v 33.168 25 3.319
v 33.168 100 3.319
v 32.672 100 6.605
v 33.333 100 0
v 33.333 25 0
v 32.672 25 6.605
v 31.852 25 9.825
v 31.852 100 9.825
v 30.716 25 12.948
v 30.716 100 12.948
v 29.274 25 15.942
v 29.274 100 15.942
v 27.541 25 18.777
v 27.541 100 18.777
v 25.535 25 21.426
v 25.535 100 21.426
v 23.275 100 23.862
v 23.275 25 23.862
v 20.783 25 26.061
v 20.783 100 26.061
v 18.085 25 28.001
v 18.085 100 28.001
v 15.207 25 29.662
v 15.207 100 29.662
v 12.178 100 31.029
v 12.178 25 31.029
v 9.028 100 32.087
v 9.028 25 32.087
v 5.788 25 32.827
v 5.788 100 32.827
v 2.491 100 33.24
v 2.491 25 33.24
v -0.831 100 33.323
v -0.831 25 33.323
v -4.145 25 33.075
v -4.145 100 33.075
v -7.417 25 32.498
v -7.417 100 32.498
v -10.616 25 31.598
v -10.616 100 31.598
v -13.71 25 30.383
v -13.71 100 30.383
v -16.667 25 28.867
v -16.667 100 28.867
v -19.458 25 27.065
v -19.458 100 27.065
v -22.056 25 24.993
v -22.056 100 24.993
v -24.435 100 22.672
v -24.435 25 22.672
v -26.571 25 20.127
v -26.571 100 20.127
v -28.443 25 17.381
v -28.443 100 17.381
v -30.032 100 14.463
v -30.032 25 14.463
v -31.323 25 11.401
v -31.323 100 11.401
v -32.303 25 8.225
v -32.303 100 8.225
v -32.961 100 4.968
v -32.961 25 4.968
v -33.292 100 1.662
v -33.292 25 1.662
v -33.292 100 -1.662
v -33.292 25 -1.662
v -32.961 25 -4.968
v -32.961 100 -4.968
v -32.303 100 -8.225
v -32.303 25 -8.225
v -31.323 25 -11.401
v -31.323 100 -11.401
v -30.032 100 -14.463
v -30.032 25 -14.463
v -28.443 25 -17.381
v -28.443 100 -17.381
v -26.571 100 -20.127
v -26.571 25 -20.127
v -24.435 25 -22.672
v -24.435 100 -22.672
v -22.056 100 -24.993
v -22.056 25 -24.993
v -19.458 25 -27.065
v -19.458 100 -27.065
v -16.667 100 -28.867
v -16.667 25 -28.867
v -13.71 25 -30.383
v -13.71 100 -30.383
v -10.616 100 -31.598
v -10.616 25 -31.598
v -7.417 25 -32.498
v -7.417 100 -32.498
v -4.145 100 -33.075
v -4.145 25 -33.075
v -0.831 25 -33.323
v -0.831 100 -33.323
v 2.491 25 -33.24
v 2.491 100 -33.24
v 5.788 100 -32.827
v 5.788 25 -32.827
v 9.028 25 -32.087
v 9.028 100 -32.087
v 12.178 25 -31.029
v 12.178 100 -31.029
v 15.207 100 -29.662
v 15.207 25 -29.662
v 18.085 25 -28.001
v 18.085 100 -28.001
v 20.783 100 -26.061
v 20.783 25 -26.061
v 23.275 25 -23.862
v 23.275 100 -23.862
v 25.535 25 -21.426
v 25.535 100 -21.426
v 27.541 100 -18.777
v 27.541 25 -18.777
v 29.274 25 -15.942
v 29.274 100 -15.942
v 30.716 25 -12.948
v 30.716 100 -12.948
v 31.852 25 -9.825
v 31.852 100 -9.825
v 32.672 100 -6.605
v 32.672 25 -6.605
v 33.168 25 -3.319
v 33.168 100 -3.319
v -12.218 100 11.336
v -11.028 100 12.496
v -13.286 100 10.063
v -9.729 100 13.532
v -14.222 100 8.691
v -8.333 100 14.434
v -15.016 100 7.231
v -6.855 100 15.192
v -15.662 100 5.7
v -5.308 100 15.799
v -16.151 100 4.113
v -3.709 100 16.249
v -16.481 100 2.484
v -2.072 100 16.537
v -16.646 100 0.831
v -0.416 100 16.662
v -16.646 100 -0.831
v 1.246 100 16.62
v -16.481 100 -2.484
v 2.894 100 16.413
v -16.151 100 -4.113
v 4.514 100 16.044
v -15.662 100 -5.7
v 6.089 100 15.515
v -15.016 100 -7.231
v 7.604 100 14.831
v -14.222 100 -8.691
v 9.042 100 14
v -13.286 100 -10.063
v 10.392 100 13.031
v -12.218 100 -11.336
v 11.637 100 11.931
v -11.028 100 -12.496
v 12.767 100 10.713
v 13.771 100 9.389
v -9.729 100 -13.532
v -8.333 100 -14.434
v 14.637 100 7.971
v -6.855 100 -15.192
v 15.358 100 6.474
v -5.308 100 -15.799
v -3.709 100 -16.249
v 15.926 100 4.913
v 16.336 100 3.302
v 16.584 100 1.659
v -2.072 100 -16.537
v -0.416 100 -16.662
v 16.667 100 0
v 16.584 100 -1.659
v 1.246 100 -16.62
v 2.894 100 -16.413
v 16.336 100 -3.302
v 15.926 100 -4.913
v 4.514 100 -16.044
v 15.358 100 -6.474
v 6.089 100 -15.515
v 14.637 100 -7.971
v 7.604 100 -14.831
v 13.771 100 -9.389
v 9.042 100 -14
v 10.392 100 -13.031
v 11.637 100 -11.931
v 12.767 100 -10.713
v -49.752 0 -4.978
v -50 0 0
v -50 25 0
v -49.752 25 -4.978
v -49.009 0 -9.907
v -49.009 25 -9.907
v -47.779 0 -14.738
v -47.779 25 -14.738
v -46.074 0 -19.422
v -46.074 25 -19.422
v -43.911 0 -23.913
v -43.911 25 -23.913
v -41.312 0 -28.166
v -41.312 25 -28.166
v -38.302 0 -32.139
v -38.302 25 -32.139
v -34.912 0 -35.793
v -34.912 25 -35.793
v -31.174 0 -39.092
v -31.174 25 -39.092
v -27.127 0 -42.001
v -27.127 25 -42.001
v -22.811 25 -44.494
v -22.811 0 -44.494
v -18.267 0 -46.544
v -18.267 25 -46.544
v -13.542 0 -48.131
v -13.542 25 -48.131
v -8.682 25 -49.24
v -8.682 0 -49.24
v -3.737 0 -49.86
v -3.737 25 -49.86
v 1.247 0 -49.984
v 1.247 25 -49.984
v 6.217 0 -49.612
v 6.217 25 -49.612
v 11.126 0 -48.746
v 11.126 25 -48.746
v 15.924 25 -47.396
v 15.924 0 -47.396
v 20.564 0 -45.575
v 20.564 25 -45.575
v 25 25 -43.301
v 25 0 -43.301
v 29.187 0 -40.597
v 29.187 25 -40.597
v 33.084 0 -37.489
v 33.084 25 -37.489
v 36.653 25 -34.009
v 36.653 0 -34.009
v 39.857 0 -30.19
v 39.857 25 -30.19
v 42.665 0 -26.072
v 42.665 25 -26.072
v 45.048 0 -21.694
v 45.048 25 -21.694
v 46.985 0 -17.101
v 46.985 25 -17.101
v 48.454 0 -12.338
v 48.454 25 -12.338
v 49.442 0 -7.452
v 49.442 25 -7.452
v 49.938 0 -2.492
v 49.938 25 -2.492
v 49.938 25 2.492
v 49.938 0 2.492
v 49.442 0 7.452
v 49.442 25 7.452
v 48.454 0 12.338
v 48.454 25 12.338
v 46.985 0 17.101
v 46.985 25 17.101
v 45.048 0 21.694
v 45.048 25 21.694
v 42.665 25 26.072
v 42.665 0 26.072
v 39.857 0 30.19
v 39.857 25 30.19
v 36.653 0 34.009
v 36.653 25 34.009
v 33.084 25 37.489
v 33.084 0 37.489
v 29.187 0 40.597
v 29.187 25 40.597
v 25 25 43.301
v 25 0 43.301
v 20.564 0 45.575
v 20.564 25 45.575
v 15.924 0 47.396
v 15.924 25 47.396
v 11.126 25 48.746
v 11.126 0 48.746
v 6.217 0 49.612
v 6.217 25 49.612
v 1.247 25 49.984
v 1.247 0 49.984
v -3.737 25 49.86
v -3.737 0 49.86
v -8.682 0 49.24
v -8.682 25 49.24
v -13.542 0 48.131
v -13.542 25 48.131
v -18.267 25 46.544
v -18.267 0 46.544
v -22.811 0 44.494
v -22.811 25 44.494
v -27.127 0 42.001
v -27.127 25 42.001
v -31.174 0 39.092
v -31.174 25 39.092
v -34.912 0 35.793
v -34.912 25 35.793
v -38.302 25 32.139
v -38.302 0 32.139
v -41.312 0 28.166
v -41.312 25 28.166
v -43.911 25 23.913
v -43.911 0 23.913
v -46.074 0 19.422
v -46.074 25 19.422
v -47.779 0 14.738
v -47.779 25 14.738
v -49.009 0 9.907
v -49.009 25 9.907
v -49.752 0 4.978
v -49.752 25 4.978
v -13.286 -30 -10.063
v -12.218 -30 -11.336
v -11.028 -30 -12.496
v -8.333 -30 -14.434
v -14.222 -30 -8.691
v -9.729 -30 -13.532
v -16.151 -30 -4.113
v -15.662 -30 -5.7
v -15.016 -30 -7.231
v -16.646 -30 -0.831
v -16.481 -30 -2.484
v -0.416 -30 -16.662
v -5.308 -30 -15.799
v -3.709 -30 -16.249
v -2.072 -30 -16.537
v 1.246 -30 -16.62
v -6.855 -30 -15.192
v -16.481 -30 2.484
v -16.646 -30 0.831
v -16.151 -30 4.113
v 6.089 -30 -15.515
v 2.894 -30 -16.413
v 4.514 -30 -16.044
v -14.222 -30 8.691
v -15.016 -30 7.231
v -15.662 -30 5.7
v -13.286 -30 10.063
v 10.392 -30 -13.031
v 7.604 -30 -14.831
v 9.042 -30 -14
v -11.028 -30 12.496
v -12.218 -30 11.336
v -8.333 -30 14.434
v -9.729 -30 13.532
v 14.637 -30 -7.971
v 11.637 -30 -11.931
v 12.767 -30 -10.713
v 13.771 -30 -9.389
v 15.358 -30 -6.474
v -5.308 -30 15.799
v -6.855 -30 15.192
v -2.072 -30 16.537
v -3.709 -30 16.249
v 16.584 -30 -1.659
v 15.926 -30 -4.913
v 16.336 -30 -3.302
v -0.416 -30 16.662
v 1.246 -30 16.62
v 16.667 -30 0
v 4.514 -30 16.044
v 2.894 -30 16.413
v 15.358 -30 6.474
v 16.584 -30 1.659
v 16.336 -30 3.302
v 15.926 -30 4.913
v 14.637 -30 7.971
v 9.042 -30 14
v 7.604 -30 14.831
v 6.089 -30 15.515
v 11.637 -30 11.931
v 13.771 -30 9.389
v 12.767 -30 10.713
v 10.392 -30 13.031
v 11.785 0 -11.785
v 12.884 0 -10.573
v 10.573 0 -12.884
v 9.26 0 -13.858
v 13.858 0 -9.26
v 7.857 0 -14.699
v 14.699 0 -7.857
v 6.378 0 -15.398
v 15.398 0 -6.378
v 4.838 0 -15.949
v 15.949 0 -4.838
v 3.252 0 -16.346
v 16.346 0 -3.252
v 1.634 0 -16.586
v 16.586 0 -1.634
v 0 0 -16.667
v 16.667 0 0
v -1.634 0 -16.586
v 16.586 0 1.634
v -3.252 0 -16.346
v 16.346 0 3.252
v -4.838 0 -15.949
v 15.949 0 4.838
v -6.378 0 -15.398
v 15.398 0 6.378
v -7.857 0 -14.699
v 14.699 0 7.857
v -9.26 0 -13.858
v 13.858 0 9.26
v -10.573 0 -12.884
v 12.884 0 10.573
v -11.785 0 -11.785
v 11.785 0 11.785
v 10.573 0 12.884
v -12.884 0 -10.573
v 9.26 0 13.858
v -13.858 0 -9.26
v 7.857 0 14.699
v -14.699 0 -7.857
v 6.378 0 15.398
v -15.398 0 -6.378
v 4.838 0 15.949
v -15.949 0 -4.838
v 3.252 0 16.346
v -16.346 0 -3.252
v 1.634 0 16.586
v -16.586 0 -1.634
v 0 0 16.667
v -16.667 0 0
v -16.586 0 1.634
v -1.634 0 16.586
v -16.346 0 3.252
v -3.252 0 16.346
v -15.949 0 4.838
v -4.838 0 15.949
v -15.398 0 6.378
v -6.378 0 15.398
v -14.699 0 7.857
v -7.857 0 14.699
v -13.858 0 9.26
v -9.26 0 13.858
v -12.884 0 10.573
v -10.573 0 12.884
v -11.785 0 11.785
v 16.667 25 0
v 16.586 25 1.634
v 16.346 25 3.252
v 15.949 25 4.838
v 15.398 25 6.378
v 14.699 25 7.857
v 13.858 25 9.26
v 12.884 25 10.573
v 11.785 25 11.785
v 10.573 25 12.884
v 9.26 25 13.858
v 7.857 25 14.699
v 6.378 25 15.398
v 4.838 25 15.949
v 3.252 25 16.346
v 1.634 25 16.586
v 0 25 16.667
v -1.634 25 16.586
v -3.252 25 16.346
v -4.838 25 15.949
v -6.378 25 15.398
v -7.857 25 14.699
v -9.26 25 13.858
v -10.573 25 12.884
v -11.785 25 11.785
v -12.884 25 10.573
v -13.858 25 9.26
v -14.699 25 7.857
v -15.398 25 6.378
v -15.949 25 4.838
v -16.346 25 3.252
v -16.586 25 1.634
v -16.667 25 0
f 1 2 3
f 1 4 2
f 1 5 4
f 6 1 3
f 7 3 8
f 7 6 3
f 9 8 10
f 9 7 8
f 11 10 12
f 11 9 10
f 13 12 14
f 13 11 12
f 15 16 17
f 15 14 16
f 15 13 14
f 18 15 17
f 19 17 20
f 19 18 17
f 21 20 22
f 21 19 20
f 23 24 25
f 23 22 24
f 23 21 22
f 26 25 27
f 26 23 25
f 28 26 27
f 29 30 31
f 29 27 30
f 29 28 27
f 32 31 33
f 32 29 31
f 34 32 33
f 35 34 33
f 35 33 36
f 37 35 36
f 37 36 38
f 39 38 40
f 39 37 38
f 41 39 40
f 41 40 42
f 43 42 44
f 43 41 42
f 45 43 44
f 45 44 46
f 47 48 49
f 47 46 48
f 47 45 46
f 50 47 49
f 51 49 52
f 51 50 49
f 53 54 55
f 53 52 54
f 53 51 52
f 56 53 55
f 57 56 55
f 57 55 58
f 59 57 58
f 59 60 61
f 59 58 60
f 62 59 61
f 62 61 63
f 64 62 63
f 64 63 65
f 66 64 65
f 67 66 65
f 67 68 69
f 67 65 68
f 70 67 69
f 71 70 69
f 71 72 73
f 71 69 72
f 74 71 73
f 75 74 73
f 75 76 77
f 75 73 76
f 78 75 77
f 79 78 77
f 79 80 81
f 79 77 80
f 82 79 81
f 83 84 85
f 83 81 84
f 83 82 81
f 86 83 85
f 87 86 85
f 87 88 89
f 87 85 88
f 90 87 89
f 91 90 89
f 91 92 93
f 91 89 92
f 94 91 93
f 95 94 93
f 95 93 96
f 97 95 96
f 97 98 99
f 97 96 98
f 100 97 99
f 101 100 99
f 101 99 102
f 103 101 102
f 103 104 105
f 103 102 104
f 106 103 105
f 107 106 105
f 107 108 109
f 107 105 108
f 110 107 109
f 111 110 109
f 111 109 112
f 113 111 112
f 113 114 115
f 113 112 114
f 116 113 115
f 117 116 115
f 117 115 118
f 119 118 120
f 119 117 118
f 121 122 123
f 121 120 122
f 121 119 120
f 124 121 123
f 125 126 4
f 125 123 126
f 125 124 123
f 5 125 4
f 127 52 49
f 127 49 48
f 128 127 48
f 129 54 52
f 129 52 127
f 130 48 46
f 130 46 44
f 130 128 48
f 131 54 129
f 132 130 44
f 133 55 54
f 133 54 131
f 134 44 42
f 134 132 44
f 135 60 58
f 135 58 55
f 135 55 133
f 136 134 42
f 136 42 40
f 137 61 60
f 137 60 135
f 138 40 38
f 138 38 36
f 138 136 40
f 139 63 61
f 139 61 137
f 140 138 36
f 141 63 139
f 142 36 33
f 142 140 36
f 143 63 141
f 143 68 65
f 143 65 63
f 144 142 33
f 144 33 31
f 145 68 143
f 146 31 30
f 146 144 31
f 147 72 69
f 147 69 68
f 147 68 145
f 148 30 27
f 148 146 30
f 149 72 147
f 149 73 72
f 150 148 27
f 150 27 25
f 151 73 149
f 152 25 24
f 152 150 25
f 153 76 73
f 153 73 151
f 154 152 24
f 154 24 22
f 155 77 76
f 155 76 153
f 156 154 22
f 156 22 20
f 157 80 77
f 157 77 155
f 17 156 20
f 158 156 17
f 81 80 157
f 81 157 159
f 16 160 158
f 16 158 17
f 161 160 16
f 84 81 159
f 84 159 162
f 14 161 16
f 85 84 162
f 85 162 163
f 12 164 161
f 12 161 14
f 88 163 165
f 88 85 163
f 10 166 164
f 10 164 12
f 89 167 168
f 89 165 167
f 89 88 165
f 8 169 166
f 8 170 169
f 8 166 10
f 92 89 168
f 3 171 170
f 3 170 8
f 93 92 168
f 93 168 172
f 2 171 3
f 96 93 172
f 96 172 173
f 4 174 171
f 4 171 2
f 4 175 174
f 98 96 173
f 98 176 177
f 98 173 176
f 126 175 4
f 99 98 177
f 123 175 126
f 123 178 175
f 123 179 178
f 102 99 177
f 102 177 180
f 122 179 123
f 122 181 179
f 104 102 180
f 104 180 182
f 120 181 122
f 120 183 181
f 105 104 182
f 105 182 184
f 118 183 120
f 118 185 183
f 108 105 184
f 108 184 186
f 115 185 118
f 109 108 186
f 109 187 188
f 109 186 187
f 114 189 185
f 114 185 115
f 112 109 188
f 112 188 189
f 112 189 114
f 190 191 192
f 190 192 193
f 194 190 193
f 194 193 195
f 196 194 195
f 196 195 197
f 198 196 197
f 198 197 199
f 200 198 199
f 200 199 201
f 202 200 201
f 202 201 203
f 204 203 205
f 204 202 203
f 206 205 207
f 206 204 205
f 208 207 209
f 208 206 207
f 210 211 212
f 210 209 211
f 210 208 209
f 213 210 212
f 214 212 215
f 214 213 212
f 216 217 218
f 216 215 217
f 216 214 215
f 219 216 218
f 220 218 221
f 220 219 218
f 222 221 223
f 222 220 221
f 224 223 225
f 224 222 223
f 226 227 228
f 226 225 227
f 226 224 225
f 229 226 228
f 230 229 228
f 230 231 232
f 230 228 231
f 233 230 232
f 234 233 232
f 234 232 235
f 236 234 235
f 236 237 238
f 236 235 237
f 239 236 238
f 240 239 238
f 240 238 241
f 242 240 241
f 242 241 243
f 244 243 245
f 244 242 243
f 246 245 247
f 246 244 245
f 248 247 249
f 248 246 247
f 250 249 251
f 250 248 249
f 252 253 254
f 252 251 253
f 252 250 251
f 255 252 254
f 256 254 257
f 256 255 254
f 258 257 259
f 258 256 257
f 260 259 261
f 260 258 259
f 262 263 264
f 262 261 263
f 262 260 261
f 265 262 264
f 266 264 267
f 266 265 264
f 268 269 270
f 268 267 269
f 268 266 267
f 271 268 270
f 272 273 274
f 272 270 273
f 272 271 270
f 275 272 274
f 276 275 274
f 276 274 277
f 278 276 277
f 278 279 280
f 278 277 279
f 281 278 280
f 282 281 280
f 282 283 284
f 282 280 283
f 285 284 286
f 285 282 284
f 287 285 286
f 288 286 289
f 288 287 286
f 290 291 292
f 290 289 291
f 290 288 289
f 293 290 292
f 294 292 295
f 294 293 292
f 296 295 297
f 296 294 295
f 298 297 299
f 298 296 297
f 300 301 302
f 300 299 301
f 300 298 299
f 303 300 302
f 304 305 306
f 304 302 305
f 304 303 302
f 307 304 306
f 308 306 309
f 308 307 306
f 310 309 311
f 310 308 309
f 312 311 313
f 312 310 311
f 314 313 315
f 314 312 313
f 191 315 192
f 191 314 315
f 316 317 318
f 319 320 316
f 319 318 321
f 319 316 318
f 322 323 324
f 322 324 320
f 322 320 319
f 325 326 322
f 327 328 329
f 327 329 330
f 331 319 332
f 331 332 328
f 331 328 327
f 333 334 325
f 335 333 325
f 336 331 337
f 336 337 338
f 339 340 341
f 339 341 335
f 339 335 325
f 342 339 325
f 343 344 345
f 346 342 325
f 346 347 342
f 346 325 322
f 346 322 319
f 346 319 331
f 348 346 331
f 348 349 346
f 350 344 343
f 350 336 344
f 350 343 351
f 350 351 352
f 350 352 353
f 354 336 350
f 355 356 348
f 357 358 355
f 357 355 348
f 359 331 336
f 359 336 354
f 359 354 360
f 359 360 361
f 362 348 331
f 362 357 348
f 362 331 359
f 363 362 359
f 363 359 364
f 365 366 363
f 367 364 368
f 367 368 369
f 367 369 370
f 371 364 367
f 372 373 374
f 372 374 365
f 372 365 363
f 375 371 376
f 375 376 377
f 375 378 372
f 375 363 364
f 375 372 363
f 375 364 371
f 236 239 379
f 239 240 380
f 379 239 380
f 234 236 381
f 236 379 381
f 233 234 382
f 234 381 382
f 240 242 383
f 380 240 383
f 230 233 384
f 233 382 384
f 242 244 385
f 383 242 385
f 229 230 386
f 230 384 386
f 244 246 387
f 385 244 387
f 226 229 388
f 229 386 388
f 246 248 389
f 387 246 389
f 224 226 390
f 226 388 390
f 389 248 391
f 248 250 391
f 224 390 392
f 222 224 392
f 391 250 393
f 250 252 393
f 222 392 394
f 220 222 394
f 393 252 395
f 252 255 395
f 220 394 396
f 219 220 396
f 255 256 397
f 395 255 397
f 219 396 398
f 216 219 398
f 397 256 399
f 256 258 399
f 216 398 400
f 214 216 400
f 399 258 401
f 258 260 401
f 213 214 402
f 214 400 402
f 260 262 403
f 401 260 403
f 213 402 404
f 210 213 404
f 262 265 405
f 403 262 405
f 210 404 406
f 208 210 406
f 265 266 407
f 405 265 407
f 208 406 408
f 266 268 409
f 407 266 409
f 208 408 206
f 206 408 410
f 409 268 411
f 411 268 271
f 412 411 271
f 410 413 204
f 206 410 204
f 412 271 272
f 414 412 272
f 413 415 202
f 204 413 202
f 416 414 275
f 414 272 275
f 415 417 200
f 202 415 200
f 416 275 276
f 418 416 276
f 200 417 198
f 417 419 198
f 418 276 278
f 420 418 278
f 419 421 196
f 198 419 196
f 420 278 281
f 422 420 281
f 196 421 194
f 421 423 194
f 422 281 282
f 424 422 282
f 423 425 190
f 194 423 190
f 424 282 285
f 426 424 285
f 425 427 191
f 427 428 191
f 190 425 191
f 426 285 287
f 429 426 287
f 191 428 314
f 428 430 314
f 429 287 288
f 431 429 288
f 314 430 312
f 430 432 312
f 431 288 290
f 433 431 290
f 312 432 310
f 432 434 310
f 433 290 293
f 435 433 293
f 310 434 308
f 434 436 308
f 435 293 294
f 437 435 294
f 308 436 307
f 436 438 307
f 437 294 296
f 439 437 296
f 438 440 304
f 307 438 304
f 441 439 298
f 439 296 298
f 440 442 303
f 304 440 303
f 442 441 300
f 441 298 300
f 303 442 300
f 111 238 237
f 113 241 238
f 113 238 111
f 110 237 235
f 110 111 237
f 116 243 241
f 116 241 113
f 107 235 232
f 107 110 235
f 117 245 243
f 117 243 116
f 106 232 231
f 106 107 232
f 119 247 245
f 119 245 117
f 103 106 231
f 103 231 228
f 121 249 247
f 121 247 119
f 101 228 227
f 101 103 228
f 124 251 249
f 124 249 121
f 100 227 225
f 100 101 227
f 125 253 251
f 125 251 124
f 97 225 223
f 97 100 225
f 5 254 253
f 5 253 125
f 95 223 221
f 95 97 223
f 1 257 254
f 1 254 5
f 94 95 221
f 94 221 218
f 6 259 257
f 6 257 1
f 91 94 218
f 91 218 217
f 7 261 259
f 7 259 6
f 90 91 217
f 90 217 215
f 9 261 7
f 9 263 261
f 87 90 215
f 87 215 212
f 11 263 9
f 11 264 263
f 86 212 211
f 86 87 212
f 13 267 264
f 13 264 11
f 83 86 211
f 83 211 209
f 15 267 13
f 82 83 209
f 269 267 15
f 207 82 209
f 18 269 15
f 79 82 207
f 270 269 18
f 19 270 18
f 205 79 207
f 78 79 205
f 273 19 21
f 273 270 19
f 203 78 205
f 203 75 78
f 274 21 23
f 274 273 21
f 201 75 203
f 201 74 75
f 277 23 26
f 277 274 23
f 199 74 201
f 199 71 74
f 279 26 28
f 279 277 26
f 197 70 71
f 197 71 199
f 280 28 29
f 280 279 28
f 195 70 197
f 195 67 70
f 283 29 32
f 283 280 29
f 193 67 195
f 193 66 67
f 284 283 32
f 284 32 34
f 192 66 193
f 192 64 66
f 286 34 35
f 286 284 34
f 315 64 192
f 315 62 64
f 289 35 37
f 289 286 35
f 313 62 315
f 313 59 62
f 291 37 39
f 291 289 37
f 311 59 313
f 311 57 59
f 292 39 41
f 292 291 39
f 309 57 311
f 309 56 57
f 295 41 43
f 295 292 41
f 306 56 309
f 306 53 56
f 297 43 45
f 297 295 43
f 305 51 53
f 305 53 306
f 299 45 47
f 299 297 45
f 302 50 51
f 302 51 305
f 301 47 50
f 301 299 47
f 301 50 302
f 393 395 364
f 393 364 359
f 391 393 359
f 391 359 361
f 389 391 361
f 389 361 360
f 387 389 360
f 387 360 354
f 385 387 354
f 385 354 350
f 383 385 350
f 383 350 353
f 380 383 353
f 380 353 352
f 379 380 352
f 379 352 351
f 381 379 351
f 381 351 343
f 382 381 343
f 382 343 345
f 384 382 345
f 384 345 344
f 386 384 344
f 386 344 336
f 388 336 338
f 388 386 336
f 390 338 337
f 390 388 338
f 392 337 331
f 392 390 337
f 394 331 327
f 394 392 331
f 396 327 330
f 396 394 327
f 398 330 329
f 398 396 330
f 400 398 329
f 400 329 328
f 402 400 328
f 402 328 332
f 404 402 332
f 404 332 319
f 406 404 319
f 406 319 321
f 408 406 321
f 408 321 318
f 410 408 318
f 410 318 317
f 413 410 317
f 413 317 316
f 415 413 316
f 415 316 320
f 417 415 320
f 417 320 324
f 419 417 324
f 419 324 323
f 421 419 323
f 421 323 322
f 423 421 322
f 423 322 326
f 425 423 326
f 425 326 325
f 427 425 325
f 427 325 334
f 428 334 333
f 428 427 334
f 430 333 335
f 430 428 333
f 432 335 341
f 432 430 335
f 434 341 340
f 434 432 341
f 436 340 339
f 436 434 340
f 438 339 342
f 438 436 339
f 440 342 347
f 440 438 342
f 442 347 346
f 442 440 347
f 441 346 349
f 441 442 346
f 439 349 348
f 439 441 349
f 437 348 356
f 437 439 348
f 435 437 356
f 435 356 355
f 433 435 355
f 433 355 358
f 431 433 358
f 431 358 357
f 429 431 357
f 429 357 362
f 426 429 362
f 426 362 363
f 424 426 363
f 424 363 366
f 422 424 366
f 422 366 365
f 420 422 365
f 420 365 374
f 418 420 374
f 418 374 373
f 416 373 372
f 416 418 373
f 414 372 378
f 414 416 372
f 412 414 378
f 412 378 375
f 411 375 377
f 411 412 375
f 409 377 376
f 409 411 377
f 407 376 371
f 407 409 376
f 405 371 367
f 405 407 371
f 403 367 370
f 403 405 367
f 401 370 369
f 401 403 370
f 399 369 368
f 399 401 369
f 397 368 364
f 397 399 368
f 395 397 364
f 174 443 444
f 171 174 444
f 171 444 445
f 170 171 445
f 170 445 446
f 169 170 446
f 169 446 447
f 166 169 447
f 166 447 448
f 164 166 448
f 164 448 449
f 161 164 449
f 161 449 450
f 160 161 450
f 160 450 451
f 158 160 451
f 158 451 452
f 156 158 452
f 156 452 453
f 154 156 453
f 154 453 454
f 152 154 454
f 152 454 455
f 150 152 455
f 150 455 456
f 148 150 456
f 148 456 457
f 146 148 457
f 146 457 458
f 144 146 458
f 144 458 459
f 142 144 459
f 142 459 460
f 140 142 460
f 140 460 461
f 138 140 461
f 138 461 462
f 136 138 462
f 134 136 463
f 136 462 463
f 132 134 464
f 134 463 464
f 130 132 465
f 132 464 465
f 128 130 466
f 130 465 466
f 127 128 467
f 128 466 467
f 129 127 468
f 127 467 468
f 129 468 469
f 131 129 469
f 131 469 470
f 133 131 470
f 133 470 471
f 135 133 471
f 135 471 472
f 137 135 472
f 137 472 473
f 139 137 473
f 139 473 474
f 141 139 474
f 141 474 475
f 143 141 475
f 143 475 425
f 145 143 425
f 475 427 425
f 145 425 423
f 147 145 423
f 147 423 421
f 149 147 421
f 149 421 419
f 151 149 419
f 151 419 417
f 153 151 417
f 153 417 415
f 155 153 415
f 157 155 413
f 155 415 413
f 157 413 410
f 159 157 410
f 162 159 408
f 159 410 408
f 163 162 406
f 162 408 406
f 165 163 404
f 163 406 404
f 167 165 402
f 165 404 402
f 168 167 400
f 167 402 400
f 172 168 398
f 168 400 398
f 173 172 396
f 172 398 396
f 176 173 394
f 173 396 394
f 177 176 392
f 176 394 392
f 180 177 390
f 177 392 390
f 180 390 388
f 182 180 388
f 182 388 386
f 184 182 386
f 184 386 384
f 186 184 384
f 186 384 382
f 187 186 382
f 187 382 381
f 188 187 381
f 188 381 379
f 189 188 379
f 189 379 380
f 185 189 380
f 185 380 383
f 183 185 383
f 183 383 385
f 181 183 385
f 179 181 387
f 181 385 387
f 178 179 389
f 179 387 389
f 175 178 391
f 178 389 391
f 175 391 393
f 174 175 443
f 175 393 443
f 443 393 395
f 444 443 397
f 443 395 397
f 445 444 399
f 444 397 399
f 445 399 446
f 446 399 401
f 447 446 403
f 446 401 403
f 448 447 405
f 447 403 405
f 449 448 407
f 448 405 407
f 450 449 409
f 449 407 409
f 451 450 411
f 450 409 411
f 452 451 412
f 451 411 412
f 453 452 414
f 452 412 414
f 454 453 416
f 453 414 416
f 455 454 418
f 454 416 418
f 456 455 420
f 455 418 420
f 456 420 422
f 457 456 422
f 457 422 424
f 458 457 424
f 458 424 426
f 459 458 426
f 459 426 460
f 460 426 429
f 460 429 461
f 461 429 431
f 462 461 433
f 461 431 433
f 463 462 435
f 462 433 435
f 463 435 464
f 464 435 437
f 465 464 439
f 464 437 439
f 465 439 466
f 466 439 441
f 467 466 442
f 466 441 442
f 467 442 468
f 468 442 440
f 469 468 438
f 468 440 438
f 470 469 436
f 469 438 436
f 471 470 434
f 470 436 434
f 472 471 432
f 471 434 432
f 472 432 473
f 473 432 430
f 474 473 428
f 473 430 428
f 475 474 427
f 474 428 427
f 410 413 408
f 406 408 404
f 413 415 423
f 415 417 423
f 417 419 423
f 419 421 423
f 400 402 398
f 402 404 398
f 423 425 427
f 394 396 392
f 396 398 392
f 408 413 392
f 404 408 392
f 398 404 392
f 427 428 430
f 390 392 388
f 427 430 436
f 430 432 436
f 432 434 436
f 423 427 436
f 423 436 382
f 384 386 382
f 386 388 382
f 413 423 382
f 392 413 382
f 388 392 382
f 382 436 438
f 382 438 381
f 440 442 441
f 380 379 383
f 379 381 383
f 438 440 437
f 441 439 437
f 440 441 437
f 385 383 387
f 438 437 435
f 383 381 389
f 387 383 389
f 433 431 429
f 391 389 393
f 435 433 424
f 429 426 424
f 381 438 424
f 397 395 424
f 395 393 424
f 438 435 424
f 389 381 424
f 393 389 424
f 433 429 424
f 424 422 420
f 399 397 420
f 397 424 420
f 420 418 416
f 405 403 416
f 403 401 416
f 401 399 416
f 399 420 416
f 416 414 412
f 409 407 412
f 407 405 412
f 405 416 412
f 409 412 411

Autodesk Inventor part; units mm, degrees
ref_plane "YZ Plane" through (0, 0, 0) normal (1, 0, 0) x (0, 1, 0)
ref_plane "XZ Plane" through (0, 0, 0) normal (0, 1, 0) x (-1, 0, 0)
ref_plane "XY Plane" through (0, 0, 0) normal (0, 0, 1) x (1, 0, 0)
sketch "Boceto1" plane through (0, 0, 0) normal (0, 1, 0) x (-1, 0, 0)
  circle A0 centre (0, 0) radius 50
  circle A1 centre (0, 0) radius 16.6667
  dimension "d0" = 100
  dimension "d1" = 33.3333
extrude "Extrusión1" add sketch "Boceto1" along normal blind 25
sketch "Boceto2" plane through (0, 25, 0) normal (0, 1, 0) x (1, 0, 0)
  circle A0 centre (0, 0) radius 33.3333
  circle A1 centre (0, 0) radius 50 projected
  circle A2 centre (0, 0) radius 16.6667 projected
  dimension "d4" = 66.6667
  dimension "d5" = 100
extrude "Extrusión2" add sketch "Boceto2" along normal blind 75 contours A0
sketch "Boceto3" plane through (0, 0, 0) normal (0, -1, 0) x (1, 0, 0)
  circle A0 centre (0, 0) radius 16.6667 projected
extrude "Extrusión3" add sketch "Boceto3" along normal blind 30
equation "\"d1\" = 0.333333 * d0"
equation "\"d4\" = 0.666667 * d5"
properties part number "Rodillo1"
